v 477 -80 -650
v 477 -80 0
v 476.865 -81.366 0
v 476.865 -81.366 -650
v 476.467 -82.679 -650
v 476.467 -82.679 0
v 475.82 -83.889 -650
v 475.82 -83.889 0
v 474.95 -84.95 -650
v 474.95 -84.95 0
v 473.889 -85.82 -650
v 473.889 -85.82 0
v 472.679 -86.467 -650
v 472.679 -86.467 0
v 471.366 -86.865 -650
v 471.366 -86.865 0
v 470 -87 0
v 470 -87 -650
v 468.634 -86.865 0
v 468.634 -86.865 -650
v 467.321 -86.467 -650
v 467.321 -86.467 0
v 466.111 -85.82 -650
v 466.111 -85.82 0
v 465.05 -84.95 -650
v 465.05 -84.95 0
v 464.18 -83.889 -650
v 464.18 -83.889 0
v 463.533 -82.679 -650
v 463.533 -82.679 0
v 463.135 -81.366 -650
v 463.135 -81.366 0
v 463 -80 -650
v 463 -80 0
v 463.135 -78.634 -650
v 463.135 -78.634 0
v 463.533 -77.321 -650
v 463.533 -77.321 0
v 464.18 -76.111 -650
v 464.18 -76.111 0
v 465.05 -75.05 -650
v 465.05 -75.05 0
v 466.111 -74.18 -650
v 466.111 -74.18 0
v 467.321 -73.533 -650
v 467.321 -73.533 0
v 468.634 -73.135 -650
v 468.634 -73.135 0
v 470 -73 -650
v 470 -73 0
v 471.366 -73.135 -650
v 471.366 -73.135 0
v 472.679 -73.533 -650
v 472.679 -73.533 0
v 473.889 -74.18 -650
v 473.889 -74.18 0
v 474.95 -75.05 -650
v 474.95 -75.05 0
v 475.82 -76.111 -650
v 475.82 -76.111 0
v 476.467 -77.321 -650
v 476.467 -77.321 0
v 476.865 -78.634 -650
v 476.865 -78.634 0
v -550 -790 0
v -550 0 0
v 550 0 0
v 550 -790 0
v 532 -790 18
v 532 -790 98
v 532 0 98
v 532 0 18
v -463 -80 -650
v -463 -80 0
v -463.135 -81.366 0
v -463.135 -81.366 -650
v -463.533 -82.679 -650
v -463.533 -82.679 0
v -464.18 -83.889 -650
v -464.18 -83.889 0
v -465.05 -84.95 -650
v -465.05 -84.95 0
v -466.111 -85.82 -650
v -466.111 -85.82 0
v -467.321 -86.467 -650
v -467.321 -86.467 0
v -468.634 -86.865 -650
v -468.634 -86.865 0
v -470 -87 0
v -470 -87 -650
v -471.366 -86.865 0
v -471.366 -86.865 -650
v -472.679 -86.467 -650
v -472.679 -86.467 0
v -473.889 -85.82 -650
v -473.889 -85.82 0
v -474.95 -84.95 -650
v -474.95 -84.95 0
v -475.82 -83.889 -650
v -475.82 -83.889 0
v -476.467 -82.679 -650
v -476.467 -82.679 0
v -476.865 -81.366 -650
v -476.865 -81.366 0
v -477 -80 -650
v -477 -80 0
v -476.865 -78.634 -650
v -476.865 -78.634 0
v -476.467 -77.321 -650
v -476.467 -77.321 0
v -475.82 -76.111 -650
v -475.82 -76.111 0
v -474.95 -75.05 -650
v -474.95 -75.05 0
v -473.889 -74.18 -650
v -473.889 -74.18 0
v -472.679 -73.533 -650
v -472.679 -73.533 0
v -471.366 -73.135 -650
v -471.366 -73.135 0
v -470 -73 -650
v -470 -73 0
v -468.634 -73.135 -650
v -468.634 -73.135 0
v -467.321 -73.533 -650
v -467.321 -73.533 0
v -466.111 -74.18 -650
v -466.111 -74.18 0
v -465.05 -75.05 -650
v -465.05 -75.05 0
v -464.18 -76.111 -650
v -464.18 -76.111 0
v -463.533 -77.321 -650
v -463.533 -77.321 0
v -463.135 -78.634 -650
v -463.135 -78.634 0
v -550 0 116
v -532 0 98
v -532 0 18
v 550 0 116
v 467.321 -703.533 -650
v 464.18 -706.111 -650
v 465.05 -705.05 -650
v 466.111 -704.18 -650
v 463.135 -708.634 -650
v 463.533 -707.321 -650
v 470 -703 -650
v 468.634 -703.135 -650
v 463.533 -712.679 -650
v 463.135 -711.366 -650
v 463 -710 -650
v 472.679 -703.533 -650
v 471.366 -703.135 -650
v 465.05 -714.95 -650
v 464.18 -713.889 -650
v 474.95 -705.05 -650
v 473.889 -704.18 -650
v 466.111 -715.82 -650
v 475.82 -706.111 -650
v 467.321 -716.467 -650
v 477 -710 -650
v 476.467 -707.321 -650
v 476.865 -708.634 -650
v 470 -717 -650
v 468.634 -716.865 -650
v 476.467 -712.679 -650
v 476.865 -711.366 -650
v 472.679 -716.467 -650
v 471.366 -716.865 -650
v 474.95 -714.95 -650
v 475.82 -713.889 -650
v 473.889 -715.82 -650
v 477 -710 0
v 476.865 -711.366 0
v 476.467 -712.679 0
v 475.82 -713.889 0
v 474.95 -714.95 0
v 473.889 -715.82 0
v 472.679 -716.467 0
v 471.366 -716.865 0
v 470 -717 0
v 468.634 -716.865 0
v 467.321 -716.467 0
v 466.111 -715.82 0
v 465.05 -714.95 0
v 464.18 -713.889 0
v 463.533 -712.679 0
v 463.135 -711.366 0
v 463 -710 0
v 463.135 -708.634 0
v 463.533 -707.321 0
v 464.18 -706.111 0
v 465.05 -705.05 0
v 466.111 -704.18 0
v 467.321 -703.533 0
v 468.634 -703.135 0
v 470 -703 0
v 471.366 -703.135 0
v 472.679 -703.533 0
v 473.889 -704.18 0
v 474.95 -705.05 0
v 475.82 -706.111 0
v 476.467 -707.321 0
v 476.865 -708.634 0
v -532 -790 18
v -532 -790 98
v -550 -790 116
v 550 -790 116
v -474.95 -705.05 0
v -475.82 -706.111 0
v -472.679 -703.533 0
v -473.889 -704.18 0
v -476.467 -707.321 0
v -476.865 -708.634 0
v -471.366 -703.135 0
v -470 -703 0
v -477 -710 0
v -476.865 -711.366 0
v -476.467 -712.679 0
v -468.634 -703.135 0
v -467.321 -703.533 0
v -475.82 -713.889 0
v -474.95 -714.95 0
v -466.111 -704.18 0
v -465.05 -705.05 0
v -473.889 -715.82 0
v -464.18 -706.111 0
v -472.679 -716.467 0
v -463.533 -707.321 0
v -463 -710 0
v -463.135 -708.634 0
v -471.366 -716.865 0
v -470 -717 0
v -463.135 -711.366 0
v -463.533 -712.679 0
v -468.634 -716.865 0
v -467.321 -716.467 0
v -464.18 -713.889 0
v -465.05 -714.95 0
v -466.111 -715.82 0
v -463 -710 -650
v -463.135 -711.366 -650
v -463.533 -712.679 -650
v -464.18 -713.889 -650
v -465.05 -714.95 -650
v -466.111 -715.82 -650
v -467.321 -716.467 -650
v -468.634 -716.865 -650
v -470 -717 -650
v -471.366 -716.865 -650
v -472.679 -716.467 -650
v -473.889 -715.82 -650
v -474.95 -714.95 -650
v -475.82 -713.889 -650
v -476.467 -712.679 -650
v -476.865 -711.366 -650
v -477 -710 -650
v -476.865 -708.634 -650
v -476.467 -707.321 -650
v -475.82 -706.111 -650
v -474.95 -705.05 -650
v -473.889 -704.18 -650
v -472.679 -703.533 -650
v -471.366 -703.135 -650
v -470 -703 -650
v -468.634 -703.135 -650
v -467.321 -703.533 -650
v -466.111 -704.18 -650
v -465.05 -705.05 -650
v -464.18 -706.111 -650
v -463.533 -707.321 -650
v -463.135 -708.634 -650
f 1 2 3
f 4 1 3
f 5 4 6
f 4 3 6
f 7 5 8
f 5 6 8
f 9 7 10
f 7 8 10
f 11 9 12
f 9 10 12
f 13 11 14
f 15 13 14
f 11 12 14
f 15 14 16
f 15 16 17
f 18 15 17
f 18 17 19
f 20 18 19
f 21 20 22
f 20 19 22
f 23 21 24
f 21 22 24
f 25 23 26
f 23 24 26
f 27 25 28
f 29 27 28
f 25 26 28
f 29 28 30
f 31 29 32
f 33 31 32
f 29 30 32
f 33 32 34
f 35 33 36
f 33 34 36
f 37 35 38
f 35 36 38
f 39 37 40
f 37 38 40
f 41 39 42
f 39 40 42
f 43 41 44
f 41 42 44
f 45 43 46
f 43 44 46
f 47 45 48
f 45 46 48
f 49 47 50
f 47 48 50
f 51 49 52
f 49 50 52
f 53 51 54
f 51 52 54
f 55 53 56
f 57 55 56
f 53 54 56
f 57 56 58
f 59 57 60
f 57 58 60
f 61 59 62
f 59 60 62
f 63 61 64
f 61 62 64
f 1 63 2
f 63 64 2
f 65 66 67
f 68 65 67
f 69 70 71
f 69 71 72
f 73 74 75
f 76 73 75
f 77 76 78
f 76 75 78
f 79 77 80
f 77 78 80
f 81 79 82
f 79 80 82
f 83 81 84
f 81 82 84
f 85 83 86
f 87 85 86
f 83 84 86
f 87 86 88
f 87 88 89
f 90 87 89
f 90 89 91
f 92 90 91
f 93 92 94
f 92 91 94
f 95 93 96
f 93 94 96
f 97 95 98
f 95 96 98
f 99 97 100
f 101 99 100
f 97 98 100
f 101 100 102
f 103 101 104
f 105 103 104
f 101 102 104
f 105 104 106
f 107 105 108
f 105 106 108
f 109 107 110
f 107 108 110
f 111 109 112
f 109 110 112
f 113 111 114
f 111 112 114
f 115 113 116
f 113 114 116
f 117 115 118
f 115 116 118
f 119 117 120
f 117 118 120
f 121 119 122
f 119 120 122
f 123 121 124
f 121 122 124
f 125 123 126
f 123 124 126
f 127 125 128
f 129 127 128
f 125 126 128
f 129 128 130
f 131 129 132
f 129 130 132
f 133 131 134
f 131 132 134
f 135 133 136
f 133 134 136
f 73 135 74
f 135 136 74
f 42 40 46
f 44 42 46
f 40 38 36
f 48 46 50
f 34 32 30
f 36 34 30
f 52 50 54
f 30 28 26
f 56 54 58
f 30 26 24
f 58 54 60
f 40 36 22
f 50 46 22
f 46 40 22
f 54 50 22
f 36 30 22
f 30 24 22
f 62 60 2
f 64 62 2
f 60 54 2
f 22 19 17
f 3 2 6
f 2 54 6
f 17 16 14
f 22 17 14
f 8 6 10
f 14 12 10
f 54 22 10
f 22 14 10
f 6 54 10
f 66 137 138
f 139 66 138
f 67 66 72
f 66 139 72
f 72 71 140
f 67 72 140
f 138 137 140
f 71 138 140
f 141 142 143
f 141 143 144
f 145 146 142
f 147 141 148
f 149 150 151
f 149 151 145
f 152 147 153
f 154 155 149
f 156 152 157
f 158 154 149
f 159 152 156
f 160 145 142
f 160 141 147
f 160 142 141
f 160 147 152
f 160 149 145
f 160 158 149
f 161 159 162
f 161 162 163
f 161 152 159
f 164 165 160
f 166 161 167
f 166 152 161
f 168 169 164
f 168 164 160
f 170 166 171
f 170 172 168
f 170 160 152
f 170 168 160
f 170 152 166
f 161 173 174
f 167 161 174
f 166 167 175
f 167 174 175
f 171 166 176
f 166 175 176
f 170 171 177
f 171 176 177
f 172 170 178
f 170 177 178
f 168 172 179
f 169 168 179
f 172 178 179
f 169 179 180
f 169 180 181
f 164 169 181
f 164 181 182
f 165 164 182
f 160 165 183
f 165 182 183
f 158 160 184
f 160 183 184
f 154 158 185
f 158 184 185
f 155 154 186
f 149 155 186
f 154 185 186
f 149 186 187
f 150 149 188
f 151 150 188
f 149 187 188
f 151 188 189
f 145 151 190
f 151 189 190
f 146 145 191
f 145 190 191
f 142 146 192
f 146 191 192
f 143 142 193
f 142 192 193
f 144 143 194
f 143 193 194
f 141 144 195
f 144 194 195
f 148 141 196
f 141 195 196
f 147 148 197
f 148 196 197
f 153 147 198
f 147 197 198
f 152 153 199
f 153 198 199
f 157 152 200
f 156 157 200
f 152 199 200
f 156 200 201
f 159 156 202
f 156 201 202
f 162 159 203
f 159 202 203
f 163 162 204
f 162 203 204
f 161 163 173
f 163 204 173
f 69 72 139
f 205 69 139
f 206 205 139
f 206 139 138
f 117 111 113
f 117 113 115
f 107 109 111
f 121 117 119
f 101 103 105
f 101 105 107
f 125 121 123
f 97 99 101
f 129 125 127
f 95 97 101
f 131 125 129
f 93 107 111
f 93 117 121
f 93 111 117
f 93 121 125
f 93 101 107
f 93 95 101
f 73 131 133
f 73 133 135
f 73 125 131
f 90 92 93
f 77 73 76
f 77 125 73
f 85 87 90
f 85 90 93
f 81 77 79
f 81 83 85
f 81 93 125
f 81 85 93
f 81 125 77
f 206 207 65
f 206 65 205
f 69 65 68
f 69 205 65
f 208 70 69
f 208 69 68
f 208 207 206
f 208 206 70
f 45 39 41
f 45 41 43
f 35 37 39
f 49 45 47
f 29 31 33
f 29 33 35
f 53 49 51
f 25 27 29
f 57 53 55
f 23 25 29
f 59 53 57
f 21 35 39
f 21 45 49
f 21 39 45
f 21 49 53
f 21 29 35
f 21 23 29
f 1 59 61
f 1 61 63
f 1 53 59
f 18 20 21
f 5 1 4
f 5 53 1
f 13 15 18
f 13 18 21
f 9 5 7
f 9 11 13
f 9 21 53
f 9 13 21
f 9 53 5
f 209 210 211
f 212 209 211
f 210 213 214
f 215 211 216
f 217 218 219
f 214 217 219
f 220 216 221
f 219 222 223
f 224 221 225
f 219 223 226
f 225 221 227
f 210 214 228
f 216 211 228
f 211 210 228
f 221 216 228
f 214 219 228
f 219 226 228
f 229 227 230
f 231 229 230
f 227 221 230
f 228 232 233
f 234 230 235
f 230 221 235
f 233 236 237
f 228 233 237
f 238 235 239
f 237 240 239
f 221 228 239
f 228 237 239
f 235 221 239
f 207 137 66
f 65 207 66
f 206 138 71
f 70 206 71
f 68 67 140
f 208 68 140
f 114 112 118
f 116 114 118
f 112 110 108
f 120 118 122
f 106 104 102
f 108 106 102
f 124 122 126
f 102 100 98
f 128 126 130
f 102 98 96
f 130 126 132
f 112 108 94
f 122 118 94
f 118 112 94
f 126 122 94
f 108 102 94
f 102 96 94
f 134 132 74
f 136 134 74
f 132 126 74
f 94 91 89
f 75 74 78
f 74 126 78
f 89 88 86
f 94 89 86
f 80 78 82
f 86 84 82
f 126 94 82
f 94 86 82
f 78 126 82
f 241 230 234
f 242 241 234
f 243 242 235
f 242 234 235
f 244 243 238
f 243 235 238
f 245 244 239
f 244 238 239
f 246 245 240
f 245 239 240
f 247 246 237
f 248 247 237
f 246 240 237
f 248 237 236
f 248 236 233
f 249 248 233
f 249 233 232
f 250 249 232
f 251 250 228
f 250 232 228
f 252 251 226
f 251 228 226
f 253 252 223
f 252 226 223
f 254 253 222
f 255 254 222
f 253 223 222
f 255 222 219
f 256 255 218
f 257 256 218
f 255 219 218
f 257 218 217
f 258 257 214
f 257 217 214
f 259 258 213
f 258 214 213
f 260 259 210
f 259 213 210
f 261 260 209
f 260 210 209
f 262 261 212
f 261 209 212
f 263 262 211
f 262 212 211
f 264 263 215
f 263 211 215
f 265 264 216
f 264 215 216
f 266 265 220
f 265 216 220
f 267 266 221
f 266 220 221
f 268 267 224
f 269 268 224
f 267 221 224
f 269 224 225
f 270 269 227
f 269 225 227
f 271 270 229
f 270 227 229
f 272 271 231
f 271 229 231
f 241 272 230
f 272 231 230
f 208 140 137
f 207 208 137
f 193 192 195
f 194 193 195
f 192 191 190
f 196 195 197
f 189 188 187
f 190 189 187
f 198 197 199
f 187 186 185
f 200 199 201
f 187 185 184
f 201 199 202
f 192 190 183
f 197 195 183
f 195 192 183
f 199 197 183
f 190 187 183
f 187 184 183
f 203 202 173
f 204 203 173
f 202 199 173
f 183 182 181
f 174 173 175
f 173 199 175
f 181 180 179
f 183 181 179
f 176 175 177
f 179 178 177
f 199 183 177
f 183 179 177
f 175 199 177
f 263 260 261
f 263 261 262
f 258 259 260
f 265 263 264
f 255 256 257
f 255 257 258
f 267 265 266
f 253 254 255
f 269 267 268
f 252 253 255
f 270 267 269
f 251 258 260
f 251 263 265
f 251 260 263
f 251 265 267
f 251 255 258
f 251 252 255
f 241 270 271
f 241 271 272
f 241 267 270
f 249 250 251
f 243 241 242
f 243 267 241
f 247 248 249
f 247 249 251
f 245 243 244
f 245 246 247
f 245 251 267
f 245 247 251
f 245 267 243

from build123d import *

# Parameters (mm, degrees)
F1_DEPTH = 790
F2_R     = 7
F3_DEPTH = 650


with BuildPart() as f1:
    # F0 (on Front) → F1 (new body)
    with BuildSketch(Plane.XZ):
        Polygon((-532, 18), (-550, 0), (550, 0), (550, 18), (532, 18), align=None)
        Polygon((532, 18), (550, 18), (550, 116), (532, 98), align=None)
        Polygon((-550, 116), (-550, 98), (-532, 98), (532, 98), (550, 116), align=None)
        Polygon((-550, 98), (-550, 0), (-532, 18), (-532, 98), align=None)
    extrude(amount=F1_DEPTH)


with BuildPart() as f3:
    # F2 (on face) → F3 (new body)
    with BuildSketch(Plane(origin=(0, 0, 0), x_dir=(1, 0, 0), z_dir=(0, 0, -1))):
        with Locations((-470, 80)):
            Circle(F2_R)
        with Locations((-470, 710)):
            Circle(F2_R)
        with Locations((470, 80)):
            Circle(F2_R)
        with Locations((470, 710)):
            Circle(F2_R)
    extrude(amount=F3_DEPTH)


solid = Compound([f1.part, f3.part])
